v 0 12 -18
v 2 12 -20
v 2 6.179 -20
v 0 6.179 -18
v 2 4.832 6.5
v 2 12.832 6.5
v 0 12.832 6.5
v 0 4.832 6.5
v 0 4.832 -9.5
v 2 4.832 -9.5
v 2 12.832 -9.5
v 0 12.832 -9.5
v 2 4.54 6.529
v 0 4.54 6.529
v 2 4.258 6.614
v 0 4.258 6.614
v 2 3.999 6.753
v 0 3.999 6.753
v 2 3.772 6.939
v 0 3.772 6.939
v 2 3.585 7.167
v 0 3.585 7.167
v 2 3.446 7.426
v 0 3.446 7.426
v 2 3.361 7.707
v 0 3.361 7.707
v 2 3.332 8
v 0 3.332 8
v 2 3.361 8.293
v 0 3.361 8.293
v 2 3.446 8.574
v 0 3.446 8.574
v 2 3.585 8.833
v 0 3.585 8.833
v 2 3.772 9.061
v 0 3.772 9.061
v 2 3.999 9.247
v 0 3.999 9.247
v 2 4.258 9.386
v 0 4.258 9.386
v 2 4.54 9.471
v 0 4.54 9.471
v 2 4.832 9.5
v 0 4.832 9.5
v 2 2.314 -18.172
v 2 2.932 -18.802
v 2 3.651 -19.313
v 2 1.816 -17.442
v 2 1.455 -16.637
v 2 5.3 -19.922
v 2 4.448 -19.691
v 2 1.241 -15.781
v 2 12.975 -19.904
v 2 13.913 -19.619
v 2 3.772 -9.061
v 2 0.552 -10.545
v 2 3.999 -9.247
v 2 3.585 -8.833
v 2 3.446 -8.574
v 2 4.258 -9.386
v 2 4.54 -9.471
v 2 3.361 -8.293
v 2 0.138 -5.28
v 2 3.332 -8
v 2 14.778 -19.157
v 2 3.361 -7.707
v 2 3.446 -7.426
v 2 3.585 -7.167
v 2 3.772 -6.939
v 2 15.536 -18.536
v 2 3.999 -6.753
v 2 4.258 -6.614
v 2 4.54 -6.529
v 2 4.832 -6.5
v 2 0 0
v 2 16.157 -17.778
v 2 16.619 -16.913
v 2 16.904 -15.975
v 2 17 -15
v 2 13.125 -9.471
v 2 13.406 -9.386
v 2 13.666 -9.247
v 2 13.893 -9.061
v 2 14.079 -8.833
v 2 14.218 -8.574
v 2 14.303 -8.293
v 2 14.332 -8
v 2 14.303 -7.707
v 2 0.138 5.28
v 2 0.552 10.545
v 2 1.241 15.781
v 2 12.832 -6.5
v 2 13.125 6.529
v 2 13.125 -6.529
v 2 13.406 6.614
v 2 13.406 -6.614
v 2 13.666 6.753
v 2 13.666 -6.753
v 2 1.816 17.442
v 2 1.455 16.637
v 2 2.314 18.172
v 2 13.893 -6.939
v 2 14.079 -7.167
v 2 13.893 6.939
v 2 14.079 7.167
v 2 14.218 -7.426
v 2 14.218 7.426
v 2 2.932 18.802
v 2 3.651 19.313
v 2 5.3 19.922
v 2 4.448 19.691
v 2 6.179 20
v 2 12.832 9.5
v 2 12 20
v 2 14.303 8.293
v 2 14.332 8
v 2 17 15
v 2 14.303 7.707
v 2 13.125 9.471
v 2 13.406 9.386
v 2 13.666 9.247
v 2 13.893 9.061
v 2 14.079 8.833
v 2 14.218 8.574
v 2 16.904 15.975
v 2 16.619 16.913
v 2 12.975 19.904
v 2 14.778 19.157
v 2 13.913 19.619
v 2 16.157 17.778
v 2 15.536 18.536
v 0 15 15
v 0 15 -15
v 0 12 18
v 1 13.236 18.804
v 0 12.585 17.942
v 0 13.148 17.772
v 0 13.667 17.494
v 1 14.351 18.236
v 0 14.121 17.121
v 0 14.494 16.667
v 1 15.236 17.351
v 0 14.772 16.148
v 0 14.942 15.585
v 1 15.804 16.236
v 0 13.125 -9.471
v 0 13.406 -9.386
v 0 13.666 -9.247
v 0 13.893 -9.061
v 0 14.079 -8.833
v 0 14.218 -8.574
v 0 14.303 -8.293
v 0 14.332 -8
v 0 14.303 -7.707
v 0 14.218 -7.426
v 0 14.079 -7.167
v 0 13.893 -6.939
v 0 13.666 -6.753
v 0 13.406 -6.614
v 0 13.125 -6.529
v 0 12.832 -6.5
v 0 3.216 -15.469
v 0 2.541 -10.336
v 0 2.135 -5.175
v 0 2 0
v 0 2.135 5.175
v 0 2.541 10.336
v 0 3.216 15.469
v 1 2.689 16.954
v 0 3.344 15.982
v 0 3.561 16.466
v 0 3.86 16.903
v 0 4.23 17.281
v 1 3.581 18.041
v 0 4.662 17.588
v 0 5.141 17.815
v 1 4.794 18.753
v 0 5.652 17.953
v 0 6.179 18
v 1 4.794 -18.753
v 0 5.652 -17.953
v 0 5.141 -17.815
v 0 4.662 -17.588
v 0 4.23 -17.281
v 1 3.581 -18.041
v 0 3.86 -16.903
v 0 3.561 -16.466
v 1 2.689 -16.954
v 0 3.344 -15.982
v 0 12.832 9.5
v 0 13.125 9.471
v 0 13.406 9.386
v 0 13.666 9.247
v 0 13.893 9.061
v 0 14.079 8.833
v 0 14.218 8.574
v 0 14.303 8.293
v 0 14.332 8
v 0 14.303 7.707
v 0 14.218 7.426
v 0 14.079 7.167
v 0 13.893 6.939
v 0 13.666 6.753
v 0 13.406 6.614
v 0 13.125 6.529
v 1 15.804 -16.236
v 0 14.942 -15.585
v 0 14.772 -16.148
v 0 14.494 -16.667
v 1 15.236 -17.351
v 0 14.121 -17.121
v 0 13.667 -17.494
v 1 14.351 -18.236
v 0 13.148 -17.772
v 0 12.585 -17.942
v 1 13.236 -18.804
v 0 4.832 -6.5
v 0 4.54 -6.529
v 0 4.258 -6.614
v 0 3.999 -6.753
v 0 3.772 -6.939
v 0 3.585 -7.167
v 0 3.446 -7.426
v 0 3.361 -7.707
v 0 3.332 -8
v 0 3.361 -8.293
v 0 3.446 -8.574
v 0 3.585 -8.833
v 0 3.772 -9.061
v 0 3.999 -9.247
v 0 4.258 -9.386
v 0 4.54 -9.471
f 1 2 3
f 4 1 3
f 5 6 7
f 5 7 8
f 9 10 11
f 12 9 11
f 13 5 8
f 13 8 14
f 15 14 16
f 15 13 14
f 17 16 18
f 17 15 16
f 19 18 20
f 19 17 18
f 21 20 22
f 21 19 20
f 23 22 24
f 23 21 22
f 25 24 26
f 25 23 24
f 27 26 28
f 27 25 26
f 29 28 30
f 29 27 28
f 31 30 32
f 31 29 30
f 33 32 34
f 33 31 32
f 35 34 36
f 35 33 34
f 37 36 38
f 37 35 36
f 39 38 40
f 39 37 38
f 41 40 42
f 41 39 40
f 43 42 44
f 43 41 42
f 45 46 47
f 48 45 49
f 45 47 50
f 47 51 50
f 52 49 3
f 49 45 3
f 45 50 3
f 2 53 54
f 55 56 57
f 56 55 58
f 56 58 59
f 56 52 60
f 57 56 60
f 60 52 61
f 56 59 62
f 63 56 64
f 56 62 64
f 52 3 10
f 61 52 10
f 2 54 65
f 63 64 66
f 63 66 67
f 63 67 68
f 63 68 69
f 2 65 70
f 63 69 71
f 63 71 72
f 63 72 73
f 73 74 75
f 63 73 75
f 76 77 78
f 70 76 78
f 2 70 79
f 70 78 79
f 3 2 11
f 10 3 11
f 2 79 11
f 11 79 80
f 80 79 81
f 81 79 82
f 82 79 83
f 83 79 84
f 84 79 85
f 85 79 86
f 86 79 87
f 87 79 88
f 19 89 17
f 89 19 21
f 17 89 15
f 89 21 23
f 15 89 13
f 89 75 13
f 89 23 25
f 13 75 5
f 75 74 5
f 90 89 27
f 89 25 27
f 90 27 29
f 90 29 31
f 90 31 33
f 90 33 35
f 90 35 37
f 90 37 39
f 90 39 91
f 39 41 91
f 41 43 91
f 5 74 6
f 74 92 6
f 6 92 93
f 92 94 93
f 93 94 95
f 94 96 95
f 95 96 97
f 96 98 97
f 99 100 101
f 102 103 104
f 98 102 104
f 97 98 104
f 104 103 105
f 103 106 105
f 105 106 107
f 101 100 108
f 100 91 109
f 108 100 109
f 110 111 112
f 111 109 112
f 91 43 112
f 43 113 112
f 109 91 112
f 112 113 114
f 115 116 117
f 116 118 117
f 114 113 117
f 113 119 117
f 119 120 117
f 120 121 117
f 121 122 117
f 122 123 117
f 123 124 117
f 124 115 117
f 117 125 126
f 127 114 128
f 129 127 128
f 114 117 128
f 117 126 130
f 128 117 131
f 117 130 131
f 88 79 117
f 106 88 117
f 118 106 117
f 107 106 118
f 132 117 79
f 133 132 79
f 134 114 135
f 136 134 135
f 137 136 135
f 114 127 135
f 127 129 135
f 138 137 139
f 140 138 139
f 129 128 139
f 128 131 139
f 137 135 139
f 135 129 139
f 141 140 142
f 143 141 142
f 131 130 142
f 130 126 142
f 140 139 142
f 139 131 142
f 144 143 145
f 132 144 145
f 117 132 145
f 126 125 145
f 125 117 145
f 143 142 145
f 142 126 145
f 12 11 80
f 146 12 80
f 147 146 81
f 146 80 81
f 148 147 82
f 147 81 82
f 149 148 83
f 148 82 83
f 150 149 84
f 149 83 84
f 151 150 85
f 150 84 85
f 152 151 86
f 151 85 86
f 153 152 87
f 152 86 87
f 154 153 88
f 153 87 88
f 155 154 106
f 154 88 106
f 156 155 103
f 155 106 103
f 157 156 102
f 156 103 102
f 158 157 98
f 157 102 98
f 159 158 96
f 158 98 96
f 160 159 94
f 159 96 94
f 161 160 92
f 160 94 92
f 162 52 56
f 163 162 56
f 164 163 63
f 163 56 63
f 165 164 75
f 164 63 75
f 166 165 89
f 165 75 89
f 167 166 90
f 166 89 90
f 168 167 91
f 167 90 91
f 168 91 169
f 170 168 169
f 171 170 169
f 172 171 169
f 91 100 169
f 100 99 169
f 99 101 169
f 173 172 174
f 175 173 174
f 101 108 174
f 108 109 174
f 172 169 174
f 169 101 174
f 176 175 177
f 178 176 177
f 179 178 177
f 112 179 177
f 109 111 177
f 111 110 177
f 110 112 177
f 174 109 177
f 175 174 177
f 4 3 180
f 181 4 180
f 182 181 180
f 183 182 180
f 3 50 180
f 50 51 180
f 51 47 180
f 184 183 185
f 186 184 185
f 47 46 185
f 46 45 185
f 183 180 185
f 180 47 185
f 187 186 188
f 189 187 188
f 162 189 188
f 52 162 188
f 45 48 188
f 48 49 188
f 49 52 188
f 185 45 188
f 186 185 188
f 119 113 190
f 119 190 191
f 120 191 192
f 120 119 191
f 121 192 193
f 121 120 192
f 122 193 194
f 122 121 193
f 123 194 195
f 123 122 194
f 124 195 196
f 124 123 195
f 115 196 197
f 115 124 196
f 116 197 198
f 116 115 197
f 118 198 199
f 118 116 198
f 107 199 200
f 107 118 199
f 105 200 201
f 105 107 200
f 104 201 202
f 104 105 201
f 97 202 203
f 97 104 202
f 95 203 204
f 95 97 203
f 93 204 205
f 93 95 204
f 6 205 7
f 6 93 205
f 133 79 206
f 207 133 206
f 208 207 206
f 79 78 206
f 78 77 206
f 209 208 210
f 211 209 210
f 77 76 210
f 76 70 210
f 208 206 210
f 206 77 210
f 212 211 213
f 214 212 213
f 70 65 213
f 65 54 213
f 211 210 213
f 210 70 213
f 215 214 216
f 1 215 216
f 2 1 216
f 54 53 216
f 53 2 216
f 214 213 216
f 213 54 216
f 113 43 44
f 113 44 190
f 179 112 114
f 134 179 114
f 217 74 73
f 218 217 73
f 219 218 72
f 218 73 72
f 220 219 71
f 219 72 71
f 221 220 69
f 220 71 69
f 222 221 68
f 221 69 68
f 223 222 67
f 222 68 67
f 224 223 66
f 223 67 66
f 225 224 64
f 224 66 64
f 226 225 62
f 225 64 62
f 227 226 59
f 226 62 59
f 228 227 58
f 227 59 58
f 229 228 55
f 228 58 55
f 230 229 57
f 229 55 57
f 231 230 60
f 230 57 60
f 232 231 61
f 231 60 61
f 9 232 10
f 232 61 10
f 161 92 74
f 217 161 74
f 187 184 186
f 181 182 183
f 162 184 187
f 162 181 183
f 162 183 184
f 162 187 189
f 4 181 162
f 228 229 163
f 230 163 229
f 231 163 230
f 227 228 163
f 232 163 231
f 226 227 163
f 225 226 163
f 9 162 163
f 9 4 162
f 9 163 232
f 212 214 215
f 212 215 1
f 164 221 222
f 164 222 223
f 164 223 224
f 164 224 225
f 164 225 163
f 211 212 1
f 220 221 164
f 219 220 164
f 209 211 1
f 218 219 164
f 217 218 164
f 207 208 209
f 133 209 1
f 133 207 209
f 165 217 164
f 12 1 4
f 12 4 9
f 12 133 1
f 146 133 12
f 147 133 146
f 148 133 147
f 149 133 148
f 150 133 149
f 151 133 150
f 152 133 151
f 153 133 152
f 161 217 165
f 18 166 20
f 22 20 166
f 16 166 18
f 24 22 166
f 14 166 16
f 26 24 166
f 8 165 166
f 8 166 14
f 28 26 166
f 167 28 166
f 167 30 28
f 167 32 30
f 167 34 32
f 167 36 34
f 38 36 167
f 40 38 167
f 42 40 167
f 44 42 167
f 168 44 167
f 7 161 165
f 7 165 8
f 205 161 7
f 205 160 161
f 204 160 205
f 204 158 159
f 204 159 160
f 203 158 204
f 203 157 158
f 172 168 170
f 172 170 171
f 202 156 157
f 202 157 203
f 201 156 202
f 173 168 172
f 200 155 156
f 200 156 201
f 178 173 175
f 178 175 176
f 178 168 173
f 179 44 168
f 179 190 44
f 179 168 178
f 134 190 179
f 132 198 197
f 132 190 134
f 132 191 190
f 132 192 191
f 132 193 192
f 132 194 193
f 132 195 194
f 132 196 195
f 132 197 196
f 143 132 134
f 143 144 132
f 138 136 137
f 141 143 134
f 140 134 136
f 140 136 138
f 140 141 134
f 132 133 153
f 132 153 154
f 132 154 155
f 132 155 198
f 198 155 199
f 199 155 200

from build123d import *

# Parameters (mm, degrees)
EXTRUDE_1_DEPTH     = 2
CUT_EXTRUDE_1_DEPTH = 2
FILLET_1_R          = 5
CHAMFER_1_SIZE      = 2


with BuildPart() as part:
    # 草图1 → 凸台-拉伸1 (new body)
    with BuildSketch(Plane(origin=(0, 0, 0), x_dir=(0, 0, -1), z_dir=(1, 0, 0))):
        with BuildLine():
            Line((-20, 2), (-20, 17))
            Line((-20, 17), (20, 17))
            Line((20, 17), (20, 2))
            ThreePointArc((20, 2), (0, 0), (-20, 2))
        make_face()
    extrude(amount=EXTRUDE_1_DEPTH)

    # 草图2 → 切除-拉伸1 (cut)
    with BuildSketch(Plane(origin=(2, 0, 0), x_dir=(0, 0, -1), z_dir=(1, 0, 0))):
        with BuildLine():
            Line((-9.5, 4.832177939), (-9.5, 12.832177939))
            ThreePointArc((-9.5, 12.832177939), (-8, 14.332177939), (-6.5, 12.832177939))
            Line((-6.5, 12.832177939), (-6.5, 4.832177939))
            ThreePointArc((-6.5, 4.832177939), (-8, 3.332177939), (-9.5, 4.832177939))
        make_face()
        with BuildLine():
            Line((9.5, 4.832177939), (9.5, 12.832177939))
            ThreePointArc((9.5, 12.832177939), (8, 14.332177939), (6.5, 12.832177939))
            Line((6.5, 12.832177939), (6.5, 4.832177939))
            ThreePointArc((6.5, 4.832177939), (8, 3.332177939), (9.5, 4.832177939))
        make_face()
    extrude(amount=-CUT_EXTRUDE_1_DEPTH, mode=Mode.SUBTRACT)

    # 圆角1
    fillet_1_edges = [part.edges().sort_by_distance(p)[0] for p in [
        (1, 2, -20),
        (1, 2, 20),
        (1, 17, 20),
        (1, 17, -20),
    ]]
    fillet(fillet_1_edges, radius=FILLET_1_R)

    # 倒角1
    chamfer_1_edges = [part.edges().sort_by_distance(p)[0] for p in [
        (0, 0, 0),
        (0, 2.93152096, -18.801726581),
        (0, 2.93152096, 18.801726581),
        (0, 9.089558112, -20),
        (0, 9.089558112, 20),
        (0, 15.535533906, -18.535533906),
        (0, 15.535533906, 18.535533906),
        (0, 17, 0),
    ]]
    chamfer(chamfer_1_edges, length=CHAMFER_1_SIZE - 0.0001)  # a hair under: the kernel refuses the full size


solid = part.part
